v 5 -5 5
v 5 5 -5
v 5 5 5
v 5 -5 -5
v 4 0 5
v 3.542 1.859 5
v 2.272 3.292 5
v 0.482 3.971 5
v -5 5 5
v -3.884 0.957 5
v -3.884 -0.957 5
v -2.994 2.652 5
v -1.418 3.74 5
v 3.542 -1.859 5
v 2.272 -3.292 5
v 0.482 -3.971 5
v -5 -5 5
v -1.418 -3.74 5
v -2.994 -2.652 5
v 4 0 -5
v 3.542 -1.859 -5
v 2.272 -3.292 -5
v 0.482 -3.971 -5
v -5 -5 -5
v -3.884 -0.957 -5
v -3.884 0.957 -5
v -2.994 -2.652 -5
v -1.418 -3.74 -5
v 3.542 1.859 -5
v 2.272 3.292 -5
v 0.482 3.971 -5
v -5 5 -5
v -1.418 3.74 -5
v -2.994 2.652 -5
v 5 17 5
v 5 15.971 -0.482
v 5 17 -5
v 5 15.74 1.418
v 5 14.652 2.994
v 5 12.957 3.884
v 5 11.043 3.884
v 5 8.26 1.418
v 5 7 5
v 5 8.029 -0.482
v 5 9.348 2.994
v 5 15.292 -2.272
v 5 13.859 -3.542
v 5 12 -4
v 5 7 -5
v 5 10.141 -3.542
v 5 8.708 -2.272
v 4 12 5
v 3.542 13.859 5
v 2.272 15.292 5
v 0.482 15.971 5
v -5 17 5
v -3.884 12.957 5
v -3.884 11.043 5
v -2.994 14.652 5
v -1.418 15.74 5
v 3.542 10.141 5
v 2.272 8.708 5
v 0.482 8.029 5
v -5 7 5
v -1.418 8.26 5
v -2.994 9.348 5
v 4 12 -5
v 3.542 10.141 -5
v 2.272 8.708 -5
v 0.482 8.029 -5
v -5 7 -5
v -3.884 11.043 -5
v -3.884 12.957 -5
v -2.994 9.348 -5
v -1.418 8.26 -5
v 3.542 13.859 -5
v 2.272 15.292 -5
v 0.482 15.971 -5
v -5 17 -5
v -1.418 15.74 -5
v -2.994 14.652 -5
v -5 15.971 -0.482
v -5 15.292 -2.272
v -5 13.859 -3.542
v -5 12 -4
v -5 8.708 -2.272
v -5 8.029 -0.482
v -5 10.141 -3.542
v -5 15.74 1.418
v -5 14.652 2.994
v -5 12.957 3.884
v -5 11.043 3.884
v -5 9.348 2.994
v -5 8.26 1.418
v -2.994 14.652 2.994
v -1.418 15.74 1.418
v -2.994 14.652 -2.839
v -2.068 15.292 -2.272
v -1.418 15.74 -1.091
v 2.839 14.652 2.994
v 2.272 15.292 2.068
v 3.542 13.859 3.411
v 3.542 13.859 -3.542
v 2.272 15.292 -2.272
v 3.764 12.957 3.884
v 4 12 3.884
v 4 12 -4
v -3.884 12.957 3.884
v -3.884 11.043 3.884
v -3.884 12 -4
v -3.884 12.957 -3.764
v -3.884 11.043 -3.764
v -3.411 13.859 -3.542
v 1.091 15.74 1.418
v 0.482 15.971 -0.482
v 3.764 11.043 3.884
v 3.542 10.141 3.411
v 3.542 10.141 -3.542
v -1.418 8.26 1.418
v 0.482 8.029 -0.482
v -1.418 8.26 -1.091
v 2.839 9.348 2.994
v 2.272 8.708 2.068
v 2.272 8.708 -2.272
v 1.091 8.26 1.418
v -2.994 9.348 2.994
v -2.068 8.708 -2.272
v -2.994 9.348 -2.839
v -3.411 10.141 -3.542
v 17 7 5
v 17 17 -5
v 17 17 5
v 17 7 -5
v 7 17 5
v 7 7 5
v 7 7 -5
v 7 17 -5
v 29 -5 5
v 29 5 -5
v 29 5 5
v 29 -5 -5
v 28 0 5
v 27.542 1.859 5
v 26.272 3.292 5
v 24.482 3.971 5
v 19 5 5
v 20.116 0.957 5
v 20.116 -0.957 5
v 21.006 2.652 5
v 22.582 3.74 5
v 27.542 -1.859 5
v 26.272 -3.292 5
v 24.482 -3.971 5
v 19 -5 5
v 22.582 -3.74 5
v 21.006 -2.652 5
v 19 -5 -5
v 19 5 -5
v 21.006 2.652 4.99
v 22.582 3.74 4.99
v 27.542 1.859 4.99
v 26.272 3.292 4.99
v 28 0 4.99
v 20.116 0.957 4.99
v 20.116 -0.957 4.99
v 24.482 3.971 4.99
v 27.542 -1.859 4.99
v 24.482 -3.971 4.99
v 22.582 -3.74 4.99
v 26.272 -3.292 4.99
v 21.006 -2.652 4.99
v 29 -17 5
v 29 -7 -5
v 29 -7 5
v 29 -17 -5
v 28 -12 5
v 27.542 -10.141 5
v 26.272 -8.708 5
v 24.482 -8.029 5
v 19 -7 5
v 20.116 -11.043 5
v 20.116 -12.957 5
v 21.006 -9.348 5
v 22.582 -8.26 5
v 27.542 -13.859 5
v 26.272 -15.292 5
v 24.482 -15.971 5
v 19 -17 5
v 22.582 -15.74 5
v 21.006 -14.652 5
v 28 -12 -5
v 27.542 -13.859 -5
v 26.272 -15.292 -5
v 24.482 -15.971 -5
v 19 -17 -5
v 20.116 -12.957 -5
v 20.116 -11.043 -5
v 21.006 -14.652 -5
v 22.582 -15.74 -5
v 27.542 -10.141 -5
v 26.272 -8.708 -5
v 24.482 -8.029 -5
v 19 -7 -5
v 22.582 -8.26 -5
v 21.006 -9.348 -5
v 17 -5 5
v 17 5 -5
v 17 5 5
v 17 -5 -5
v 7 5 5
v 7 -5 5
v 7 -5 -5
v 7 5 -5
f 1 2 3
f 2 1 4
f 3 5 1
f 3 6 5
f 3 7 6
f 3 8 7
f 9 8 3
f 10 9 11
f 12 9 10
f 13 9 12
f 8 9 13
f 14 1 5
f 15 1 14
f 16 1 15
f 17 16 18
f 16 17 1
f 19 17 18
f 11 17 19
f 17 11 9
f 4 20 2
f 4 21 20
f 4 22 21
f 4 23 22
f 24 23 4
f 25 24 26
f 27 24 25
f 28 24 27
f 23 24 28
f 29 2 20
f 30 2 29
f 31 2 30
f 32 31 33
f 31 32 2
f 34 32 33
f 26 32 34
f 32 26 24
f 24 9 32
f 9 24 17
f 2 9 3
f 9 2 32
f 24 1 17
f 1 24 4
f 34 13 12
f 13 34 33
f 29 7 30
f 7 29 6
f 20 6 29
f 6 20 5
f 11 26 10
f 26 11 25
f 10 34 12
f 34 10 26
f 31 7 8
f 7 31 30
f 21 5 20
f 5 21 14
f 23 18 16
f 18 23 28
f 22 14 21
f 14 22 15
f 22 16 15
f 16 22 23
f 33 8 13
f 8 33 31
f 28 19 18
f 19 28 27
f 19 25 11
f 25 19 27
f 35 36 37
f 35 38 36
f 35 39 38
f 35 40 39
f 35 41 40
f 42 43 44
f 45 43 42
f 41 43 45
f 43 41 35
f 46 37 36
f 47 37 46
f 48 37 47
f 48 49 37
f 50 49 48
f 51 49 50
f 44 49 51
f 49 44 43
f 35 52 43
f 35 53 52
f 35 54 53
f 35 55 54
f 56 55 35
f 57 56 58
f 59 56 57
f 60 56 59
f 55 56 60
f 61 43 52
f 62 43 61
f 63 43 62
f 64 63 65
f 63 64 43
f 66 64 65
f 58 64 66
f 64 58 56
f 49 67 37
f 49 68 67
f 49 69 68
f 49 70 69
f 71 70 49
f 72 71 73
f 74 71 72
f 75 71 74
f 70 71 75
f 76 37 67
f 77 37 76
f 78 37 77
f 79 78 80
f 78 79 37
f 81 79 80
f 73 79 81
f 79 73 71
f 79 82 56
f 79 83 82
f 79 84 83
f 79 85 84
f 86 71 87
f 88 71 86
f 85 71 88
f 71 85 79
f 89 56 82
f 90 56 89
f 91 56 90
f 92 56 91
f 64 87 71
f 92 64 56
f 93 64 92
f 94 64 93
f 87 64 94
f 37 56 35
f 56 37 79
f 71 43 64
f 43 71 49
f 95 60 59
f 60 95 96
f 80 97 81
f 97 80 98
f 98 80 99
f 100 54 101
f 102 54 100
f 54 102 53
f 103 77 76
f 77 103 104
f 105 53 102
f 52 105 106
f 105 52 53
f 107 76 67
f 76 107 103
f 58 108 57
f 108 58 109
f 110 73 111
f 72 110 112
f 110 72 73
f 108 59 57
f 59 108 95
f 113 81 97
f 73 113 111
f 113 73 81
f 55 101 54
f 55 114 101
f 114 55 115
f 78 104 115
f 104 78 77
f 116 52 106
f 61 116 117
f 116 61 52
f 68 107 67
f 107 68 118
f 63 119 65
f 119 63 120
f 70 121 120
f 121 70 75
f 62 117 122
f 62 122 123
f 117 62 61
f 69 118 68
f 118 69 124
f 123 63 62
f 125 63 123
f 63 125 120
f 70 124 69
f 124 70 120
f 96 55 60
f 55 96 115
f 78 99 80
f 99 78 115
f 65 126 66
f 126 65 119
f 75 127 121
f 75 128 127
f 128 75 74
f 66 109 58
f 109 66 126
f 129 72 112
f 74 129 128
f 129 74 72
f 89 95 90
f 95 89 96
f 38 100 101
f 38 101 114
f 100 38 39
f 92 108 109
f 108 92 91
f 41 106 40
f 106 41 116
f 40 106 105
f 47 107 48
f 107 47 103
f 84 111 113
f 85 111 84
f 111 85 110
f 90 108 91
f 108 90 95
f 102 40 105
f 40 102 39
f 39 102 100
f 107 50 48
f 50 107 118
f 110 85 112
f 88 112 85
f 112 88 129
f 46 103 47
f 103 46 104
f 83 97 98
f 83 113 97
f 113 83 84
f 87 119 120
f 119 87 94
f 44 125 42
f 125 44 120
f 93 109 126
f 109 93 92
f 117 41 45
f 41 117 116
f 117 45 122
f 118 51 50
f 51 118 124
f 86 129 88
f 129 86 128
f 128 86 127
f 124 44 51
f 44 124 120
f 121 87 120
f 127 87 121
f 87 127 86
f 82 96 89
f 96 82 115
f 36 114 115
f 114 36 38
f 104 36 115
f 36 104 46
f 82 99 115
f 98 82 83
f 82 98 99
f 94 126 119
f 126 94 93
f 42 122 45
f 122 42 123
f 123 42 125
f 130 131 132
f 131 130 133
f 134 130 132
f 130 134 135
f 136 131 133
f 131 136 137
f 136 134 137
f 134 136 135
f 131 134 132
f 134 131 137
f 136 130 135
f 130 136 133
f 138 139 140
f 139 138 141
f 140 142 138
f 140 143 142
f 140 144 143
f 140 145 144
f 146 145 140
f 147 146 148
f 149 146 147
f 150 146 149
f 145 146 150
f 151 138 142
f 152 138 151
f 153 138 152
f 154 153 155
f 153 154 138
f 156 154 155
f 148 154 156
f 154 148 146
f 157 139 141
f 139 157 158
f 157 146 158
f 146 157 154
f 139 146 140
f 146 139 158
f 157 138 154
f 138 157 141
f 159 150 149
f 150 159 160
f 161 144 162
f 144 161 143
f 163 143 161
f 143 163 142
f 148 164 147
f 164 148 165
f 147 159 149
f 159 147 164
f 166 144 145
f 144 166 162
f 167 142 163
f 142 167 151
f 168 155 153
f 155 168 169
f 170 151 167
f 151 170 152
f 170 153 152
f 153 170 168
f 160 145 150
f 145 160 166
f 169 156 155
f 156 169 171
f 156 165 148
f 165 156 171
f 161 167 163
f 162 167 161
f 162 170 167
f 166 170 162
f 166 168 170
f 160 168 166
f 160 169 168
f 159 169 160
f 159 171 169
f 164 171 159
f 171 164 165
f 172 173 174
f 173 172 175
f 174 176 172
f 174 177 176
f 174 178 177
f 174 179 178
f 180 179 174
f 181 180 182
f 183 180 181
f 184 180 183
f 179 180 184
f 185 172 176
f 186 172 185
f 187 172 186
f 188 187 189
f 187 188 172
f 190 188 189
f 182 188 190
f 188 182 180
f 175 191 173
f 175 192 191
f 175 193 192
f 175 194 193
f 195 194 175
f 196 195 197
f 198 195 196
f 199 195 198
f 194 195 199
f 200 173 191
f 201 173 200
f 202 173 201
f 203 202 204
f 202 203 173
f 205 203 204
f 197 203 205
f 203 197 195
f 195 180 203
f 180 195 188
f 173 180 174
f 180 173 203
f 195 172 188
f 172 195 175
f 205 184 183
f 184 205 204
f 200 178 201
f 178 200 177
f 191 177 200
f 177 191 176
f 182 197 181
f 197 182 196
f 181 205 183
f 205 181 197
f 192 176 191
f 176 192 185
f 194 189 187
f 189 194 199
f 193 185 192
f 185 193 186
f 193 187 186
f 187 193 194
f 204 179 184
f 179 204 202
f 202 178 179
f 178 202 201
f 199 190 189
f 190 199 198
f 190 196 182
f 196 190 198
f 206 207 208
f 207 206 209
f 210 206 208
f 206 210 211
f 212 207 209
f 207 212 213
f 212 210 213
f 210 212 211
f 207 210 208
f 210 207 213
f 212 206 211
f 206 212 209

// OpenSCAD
// Volume: 4387.988645167345, SurfaceArea: 3960.6408935564273
// Empty
difference();
// No children
difference() { }

// Basic
difference() {
  cube([10,10,10], center=true);
  cylinder(r=4, h=20, center=true);
}

// Two negative objects
translate([0,12,0]) difference() {
  cube([10,10,10], center=true);
  cylinder(r=4, h=11, center=true);
  rotate([0,90,0]) cylinder(r=4, h=11, center=true);
}

// Not intersecting
translate([12,12,0]) difference() {
  cube([10,10,10], center=true);
  translate([0,0,7.01]) cylinder(r=4, h=4, center=true);
}

// Barely intersecting
translate([24,0,0]) difference() {
  cube([10,10,10], center=true);
  translate([0,0,6.99]) cylinder(r=4, h=4, center=true);
}

// Subtracting something from nothing
translate([24,12,0]) difference() {
  cube([0,10,10], center=true);
  # cylinder(r=4, h=20, center=true);
}

// Non-geometry (echo) statement as first child should be ignored
translate([24,-12,0]) difference() {
  echo("difference-tests");
  cube([10,10,10], center=true);
  cylinder(r=4, h=20, center=true);
}

// Subtracting 2D from 3D
translate([12,0,0]) difference() {
  cube([10,10,10], center=true);
  circle(r=6);
}
